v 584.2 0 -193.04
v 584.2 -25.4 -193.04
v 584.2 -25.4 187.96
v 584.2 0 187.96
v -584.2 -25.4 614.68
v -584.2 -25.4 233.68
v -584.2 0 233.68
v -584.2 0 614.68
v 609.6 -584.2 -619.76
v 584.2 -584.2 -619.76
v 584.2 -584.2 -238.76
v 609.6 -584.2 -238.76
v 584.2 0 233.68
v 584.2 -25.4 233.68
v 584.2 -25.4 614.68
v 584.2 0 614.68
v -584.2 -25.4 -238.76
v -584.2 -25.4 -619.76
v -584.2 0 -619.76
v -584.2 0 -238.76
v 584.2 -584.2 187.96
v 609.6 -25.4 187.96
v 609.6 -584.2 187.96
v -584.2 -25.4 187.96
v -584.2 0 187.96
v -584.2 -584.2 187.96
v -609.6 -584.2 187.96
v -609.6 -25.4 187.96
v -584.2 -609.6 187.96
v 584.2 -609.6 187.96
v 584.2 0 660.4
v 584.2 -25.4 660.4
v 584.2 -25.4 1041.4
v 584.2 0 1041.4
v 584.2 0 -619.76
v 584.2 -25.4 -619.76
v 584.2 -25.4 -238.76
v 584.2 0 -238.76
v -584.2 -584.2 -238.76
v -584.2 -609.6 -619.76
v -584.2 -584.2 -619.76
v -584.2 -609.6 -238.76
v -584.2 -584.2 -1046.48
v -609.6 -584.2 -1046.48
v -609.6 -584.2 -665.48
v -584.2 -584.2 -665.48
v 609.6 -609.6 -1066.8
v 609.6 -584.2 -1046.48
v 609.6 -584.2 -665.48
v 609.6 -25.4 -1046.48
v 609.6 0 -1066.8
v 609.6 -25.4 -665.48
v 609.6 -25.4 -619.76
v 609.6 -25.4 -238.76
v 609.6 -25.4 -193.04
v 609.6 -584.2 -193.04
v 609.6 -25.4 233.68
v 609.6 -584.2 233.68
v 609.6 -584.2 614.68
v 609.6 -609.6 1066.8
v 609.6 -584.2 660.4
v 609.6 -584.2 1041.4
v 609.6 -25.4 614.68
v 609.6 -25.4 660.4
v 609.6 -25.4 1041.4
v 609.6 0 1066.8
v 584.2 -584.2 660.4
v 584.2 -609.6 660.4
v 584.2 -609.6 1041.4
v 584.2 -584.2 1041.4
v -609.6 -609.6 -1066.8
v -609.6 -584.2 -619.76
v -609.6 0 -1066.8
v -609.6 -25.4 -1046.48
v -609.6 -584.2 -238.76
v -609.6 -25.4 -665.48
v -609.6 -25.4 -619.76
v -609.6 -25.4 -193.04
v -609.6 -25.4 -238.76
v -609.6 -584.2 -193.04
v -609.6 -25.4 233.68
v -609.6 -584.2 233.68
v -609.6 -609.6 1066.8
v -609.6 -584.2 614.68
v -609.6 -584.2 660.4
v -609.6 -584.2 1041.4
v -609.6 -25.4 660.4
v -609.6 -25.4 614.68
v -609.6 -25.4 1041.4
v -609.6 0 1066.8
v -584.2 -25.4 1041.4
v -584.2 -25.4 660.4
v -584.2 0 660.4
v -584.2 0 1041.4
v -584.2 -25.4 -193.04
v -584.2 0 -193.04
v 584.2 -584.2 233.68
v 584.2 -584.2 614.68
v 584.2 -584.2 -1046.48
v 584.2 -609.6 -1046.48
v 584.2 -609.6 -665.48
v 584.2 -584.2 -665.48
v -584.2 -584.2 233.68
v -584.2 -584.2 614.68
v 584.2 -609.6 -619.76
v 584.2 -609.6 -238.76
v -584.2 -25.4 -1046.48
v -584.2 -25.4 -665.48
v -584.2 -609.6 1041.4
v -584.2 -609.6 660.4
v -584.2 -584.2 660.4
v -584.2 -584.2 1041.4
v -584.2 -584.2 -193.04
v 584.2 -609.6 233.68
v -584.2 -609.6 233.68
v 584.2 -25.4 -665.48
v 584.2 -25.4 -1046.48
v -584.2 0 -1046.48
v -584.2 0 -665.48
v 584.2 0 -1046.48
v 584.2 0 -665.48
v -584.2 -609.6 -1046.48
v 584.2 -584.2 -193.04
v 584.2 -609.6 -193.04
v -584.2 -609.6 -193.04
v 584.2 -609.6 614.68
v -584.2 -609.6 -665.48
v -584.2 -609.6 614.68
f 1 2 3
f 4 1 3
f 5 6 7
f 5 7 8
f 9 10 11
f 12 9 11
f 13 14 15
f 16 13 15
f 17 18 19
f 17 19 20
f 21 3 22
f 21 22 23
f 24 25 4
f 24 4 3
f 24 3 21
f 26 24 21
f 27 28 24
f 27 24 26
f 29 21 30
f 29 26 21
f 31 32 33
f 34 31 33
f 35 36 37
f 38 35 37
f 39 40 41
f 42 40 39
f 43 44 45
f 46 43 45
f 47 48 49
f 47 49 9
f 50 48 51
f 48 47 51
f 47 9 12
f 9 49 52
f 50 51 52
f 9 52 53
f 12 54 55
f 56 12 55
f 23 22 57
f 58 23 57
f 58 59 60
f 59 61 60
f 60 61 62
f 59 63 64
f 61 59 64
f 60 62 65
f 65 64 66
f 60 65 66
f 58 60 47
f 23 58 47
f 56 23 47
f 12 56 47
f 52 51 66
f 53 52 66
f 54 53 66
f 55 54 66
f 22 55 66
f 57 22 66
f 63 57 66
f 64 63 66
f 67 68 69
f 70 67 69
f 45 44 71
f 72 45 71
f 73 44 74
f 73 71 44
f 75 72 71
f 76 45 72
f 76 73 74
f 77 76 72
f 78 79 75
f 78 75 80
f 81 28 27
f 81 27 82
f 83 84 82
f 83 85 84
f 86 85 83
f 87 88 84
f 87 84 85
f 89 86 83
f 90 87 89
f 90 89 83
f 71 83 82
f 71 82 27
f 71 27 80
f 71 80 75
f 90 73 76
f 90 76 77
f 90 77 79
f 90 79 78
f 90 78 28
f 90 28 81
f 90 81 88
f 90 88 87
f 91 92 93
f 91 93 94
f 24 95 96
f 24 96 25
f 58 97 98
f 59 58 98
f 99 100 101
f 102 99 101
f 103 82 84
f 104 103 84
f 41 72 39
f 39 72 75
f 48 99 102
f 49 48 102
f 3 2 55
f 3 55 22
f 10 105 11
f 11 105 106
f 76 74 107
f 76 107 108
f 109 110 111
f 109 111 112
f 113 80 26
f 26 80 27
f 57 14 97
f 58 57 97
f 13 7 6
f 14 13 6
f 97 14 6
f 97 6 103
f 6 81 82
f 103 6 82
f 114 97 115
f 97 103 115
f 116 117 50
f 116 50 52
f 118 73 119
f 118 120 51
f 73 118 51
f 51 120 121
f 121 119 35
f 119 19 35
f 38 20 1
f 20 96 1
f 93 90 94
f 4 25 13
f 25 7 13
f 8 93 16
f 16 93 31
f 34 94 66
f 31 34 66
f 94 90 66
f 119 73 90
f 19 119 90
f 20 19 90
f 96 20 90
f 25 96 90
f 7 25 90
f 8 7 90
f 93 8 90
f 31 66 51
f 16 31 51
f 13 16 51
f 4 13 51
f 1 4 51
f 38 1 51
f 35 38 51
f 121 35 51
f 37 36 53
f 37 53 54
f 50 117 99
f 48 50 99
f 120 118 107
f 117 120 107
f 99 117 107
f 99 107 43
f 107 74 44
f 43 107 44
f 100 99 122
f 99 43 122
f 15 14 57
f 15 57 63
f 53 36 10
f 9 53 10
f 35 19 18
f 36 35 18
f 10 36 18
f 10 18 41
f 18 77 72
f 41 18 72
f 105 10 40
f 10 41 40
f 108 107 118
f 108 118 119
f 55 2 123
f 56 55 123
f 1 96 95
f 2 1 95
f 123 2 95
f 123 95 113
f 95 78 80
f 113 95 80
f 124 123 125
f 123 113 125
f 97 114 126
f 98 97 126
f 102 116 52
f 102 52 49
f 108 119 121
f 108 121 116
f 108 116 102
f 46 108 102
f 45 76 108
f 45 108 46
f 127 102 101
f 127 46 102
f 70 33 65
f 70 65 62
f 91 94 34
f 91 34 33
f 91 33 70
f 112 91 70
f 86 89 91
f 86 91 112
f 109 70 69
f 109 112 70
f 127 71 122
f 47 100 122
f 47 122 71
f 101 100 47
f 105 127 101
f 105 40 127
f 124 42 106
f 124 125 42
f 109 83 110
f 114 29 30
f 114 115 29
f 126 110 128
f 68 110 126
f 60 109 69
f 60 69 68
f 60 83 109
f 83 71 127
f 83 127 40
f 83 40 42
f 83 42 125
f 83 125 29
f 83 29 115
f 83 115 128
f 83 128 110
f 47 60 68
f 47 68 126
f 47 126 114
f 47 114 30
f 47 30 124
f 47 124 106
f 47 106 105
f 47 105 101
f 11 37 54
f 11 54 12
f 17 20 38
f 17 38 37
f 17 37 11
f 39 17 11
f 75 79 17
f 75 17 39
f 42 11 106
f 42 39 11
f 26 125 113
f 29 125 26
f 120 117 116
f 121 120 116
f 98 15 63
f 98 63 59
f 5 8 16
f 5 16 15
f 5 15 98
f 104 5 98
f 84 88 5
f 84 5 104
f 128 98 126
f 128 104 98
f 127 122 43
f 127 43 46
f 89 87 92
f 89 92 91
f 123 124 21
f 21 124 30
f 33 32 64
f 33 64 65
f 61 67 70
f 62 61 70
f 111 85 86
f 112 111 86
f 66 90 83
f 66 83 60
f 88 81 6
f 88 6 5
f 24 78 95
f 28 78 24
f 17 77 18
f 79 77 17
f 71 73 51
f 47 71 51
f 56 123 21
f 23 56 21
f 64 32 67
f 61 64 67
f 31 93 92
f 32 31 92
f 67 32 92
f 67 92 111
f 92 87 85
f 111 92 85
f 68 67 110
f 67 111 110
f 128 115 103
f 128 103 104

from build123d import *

# Parameters (mm, degrees)
F0_W     = 1219.2
F0_H     = 2133.6
F1_DEPTH = 609.6
F2_W     = 1168.4
F2_H     = 381
F3_DEPTH = 609.601
F4_W     = 558.8
F4_H     = 381
F5_DEPTH = 1219.201


with BuildPart() as f1:
    # F0 (on Front) → F1 (new body)
    with BuildSketch(Plane.XZ):
        Rectangle(F0_W, F0_H)
    extrude(amount=F1_DEPTH)

    # F2 (on face) → F3 (cut, through all)
    with BuildSketch(Plane.XZ.offset(609.6)):
        with Locations((0, 850.9)):
            Rectangle(F2_W, F2_H)
        with Locations((0, 424.18)):
            Rectangle(F2_W, F2_H)
        with Locations((0, -2.54)):
            Rectangle(F2_W, F2_H)
        with Locations((0, -429.26)):
            Rectangle(F2_W, F2_H)
        with Locations((0, -855.98)):
            Rectangle(F2_W, F2_H)
    extrude(amount=-F3_DEPTH, mode=Mode.SUBTRACT)

    # F4 (on face) → F5 (cut, through all)
    with BuildSketch(Plane(origin=(-609.6, 0, 0), x_dir=(0, -1, 0), z_dir=(-1, 0, 0))):
        with Locations((304.8, 850.9)):
            Rectangle(F4_W, F4_H)
        with Locations((304.8, 424.18)):
            Rectangle(F4_W, F4_H)
        with Locations((304.8, -2.54)):
            Rectangle(F4_W, F4_H)
        with Locations((304.8, -429.26)):
            Rectangle(F4_W, F4_H)
        with Locations((304.8, -855.98)):
            Rectangle(F4_W, F4_H)
    extrude(amount=-F5_DEPTH, mode=Mode.SUBTRACT)


solid = f1.part
